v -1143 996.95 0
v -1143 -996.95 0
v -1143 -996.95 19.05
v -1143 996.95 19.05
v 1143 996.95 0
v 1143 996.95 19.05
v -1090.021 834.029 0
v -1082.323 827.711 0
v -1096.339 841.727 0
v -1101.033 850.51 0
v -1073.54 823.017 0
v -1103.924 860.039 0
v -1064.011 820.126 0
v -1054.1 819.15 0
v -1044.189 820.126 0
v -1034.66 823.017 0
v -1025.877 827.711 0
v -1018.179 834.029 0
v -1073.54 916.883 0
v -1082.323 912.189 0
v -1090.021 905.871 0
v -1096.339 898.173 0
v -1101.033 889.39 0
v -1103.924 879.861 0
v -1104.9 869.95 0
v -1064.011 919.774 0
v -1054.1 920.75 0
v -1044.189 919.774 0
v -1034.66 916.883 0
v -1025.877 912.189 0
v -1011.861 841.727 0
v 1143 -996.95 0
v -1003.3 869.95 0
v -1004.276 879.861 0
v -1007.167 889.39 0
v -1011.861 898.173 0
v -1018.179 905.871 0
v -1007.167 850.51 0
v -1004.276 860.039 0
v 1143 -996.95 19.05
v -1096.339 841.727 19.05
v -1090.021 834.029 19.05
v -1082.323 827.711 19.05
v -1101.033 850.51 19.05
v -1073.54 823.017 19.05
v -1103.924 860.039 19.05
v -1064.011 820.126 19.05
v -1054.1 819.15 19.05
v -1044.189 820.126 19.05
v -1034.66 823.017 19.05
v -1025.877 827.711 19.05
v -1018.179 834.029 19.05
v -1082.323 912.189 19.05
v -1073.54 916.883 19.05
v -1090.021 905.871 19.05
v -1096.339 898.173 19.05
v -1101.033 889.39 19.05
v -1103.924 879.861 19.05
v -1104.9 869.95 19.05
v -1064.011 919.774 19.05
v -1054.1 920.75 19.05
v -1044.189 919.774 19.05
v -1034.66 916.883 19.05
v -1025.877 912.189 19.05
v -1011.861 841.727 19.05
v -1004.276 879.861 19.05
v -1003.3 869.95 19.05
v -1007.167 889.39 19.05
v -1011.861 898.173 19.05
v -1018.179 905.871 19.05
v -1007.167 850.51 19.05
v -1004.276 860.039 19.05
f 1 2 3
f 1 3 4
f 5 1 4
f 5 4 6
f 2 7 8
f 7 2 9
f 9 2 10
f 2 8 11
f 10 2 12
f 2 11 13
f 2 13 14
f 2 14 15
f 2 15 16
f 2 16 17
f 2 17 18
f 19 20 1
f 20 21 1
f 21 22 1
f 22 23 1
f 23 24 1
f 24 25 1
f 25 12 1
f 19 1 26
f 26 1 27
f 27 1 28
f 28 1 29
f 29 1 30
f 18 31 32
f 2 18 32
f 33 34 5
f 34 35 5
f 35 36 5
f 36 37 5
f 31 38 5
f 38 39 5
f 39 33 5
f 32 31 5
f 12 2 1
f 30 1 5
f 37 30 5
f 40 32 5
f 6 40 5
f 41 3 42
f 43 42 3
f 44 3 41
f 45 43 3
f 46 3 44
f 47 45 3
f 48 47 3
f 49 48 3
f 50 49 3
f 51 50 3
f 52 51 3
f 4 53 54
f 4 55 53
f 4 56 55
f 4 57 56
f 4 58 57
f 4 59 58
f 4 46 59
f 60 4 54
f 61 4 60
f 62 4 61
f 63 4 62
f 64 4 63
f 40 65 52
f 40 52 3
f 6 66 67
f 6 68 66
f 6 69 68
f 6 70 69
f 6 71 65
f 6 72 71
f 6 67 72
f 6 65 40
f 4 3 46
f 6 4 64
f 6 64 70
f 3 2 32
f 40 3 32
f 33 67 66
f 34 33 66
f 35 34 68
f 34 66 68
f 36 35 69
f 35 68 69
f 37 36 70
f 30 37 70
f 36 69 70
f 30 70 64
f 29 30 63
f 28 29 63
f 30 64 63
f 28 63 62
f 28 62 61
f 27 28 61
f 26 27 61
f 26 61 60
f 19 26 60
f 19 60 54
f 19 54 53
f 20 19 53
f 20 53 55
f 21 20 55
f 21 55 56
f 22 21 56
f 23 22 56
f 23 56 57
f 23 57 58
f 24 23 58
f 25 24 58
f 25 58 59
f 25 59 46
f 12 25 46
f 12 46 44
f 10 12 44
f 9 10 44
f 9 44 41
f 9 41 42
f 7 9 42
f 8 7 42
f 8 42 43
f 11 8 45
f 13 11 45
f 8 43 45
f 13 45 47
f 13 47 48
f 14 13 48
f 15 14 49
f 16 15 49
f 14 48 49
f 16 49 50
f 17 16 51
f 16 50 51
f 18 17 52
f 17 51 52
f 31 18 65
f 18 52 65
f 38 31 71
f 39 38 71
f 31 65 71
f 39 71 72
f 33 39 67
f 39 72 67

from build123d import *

# Parameters (mm, degrees)
F0_W     = 2286
F0_H     = 1993.9
F1_DEPTH = 19.05
F2_W     = 2286
F2_H     = 1993.9
F2_R     = 50.8
F3_DEPTH = 19.051


with BuildPart() as f1:
    # F0 (on Top) → F1 (new body)
    with BuildSketch(Plane.XY):
        Rectangle(F0_W, F0_H)
    extrude(amount=F1_DEPTH)

    # F2 (on face) → F3 (intersect, through all)
    with BuildSketch(Plane.XY.offset(19.05)):
        Rectangle(F2_W, F2_H)
        with Locations((-1054.1, 869.95)):
            Circle(F2_R, mode=Mode.SUBTRACT)
    extrude(amount=-F3_DEPTH, mode=Mode.INTERSECT)


solid = f1.part
